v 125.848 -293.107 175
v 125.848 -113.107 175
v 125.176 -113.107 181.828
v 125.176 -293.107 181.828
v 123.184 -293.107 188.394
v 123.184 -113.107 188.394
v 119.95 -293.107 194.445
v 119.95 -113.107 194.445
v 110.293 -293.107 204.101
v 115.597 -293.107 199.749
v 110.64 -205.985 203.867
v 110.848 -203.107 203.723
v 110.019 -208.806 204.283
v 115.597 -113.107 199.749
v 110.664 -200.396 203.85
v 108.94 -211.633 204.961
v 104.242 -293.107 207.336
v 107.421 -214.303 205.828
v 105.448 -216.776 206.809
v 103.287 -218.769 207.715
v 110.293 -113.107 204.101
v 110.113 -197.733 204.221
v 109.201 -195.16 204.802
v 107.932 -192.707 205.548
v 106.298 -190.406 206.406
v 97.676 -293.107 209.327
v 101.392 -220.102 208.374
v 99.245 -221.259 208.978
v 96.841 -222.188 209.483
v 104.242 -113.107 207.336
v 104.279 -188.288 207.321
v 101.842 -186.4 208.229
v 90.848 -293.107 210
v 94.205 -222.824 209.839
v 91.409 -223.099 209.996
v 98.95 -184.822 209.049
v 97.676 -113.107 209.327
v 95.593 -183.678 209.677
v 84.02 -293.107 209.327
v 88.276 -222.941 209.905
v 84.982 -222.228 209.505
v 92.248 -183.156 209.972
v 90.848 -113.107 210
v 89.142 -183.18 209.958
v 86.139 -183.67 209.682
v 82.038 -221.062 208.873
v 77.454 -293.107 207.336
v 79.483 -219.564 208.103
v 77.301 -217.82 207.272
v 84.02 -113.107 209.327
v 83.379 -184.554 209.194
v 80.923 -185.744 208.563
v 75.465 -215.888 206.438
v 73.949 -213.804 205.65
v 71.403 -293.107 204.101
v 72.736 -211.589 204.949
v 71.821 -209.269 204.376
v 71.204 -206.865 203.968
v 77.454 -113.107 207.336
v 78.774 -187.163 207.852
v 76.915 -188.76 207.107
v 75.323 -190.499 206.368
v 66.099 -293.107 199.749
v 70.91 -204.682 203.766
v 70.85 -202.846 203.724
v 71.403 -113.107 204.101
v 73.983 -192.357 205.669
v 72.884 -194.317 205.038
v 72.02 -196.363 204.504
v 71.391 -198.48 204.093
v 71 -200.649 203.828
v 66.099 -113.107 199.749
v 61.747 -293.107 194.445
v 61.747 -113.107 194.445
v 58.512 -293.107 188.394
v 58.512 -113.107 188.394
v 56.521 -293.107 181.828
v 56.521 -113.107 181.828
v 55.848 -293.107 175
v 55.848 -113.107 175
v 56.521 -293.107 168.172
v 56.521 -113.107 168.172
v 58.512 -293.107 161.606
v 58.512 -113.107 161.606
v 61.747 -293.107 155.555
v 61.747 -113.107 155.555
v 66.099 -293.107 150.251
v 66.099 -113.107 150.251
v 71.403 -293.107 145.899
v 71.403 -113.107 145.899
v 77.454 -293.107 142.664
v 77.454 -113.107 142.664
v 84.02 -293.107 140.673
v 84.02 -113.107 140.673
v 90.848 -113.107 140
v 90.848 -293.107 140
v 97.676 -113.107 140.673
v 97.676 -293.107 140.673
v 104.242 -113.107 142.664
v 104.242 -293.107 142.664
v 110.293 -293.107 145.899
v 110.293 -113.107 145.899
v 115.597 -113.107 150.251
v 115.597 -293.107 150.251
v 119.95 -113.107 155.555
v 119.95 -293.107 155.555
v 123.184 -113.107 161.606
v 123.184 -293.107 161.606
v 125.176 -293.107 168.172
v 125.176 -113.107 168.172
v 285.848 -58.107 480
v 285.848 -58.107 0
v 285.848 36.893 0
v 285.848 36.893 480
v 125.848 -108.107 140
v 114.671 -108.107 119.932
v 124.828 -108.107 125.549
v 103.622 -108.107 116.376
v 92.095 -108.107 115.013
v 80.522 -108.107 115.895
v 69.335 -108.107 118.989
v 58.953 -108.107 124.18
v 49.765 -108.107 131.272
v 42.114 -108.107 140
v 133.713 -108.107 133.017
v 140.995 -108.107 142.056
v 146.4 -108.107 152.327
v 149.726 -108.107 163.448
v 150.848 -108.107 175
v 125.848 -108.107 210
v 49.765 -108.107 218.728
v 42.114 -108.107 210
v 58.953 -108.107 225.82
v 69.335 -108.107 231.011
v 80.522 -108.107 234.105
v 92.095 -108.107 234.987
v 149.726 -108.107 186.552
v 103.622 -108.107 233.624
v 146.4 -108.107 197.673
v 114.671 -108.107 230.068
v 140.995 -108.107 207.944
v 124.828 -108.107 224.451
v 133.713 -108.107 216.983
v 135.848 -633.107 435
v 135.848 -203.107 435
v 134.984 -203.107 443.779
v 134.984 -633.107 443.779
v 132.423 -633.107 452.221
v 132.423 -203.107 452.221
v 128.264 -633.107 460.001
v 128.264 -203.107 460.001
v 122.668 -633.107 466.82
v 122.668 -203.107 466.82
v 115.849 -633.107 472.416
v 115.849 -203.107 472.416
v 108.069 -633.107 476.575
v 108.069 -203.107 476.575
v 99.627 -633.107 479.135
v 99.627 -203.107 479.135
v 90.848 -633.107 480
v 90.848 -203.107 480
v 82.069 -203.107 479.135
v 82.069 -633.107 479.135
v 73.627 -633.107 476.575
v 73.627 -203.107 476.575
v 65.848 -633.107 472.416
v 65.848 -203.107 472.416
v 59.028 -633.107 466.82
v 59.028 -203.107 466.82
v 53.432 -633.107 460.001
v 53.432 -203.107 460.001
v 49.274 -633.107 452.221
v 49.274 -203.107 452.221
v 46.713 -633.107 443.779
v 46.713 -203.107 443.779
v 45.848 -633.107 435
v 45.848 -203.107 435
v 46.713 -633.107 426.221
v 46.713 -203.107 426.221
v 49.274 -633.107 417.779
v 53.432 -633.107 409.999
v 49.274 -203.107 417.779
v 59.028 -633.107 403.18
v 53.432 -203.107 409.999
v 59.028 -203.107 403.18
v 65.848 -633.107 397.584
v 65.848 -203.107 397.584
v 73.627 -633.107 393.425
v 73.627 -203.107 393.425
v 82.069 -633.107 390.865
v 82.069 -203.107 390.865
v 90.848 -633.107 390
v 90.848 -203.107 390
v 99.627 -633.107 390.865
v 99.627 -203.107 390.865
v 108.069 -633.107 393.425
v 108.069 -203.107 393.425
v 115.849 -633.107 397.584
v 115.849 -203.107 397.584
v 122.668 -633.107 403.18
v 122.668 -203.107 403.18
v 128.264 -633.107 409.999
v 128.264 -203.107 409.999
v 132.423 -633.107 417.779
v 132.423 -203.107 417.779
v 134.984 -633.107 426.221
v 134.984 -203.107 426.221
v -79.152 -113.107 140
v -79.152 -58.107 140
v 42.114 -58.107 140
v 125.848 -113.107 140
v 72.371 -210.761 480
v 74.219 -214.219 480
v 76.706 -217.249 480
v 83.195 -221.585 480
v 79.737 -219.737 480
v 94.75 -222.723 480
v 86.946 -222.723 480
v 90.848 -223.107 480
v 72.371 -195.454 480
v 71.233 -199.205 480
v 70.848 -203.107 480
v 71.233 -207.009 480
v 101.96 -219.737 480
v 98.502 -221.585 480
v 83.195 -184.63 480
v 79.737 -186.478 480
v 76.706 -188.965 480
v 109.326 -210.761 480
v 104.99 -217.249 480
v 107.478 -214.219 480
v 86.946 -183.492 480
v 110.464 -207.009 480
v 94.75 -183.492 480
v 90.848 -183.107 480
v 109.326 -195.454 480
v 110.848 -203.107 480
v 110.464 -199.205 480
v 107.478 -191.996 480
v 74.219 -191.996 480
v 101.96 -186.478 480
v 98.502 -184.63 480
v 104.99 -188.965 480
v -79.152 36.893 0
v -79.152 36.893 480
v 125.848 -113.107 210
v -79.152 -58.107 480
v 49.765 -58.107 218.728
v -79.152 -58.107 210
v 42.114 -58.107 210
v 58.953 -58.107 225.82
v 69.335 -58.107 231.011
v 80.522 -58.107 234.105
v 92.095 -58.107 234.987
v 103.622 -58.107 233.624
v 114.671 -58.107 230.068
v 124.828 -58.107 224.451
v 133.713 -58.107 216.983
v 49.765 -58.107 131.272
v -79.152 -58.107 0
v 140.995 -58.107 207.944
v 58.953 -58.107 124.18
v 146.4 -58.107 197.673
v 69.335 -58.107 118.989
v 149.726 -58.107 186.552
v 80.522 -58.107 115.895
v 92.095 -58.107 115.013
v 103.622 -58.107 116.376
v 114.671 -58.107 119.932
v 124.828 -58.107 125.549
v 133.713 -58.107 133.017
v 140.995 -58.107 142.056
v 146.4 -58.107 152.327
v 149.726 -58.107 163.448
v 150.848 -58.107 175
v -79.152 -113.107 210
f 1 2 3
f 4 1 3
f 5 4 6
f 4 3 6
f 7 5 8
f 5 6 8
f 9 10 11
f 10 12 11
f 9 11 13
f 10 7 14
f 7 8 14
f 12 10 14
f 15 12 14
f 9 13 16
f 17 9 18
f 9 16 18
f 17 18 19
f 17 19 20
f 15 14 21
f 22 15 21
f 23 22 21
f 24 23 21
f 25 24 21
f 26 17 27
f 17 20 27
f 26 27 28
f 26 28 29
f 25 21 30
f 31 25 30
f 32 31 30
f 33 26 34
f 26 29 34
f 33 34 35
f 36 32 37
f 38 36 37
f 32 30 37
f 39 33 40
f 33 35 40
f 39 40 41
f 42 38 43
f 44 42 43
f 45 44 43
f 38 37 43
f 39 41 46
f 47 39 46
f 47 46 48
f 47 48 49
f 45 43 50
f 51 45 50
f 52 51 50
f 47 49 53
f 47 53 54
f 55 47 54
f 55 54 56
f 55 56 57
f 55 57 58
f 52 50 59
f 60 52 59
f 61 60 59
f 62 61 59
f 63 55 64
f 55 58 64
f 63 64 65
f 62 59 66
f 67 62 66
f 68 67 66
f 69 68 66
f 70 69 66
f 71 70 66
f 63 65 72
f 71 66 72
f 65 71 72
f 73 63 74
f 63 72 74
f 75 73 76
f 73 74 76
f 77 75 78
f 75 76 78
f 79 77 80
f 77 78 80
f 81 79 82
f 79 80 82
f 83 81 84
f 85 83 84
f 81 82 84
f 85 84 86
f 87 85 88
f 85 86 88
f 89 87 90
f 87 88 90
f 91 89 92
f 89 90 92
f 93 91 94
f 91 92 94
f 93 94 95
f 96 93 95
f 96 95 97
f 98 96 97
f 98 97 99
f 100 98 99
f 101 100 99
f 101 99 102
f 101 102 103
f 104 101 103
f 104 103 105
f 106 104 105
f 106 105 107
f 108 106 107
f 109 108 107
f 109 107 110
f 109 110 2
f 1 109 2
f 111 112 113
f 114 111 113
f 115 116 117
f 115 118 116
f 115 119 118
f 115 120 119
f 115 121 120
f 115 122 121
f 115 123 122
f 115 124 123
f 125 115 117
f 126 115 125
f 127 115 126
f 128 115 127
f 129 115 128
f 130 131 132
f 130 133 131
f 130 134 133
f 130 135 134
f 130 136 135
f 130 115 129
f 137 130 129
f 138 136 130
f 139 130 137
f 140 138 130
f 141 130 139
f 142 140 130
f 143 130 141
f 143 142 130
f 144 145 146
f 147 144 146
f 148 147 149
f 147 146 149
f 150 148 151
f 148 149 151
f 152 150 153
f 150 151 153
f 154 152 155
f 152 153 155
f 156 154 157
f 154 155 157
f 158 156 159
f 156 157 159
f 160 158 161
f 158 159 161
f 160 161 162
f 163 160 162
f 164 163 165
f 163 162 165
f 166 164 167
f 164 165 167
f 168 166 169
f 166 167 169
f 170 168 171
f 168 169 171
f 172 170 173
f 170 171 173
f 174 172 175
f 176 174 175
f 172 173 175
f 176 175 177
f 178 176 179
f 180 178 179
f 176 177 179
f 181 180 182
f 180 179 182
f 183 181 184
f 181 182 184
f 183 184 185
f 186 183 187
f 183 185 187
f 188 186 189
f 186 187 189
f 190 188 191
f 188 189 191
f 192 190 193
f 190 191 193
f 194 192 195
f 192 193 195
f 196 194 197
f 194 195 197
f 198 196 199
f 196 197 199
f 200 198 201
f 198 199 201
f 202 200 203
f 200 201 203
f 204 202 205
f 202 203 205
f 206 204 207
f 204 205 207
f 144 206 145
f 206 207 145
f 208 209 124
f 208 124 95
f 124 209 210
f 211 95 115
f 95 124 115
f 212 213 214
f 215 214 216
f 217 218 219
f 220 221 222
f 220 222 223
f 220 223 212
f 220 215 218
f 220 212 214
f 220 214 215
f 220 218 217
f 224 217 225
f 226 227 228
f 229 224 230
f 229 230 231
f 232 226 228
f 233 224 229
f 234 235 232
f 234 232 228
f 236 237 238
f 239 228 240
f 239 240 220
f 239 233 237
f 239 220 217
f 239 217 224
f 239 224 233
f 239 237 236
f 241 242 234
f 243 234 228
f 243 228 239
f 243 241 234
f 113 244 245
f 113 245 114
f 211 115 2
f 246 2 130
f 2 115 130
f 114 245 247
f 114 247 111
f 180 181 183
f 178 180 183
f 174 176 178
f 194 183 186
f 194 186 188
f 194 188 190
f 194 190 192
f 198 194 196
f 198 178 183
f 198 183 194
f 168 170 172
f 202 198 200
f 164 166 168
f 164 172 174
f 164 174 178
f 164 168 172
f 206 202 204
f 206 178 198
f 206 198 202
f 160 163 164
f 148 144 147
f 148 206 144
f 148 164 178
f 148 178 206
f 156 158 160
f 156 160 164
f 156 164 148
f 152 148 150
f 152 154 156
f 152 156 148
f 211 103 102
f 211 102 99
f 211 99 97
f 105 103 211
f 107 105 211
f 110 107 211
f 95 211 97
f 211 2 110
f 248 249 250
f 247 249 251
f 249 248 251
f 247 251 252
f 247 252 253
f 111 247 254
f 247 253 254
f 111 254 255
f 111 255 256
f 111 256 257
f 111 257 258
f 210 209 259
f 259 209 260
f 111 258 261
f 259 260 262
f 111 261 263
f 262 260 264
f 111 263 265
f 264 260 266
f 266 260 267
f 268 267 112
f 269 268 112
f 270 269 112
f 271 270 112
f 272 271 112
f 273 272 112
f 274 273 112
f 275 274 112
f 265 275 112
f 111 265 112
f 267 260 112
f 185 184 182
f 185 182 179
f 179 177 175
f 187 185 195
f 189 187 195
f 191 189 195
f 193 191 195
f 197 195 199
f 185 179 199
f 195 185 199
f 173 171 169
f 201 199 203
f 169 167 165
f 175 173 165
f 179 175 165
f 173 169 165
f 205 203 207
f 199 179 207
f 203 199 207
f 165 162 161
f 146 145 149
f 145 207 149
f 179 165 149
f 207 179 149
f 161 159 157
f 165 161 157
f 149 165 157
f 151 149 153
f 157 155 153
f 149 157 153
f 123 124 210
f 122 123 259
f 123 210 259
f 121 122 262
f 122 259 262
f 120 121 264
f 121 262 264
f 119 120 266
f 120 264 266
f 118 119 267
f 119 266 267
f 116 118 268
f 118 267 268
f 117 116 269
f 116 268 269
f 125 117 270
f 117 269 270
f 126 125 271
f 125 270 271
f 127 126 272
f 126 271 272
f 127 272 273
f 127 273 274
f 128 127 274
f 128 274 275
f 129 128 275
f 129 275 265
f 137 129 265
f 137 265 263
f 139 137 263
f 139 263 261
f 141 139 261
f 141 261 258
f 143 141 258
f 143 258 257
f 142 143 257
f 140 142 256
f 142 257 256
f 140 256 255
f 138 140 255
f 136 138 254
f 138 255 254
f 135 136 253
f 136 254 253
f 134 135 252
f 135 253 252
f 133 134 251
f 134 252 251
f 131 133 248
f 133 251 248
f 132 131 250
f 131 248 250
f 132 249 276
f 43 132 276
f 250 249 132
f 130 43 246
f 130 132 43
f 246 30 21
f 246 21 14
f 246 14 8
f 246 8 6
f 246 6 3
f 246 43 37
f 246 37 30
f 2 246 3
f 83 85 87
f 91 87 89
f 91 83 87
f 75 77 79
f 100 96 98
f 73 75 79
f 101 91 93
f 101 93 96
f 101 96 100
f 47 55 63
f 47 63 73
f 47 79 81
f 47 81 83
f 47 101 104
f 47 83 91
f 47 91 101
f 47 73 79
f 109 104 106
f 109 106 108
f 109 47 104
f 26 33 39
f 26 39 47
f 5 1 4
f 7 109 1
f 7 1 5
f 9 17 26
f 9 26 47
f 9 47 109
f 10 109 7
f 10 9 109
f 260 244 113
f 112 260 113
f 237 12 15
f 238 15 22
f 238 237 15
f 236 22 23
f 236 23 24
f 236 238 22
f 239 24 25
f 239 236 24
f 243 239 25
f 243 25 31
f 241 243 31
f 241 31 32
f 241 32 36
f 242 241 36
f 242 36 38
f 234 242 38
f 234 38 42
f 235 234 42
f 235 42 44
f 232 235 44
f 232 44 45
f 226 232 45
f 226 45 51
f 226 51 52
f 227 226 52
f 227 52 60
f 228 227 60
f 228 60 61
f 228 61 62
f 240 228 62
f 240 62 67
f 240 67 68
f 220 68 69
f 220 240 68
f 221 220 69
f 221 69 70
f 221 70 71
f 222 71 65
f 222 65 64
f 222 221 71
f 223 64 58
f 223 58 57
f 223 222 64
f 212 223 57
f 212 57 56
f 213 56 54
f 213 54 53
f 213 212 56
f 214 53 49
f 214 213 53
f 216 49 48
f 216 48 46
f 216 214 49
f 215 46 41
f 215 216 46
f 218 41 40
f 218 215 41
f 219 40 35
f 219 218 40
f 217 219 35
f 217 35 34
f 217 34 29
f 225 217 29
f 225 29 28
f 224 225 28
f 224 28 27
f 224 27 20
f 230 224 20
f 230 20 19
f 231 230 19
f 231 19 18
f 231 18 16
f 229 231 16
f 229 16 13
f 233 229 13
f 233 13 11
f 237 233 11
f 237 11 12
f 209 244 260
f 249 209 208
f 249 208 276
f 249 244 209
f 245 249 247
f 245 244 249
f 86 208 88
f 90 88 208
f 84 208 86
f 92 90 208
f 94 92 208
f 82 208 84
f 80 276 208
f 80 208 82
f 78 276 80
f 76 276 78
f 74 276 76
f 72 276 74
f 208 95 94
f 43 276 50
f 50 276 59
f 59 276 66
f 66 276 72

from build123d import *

# Parameters (mm, degrees)
ESQUISSE1_W        = 365
ESQUISSE1_H        = 95
BOSS_EXTRU_1_DEPTH = 480
ESQUISSE3_R        = 35
BOSS_EXTRU_2_DEPTH = 235
BOSS_EXTRU_3_REACH = 482
ESQUISSE4_R        = 20
BOSS_EXTRU_4_START = 145
ESQUISSE5_R        = 45
BOSS_EXTRU_4_DEPTH = 430
ESQUISSE6_W        = 205
ESQUISSE6_H        = 70
BOSS_EXTRU_5_DEPTH = 55
ESQUISSE7_R        = 60
BOSS_EXTRU_6_DEPTH = 50


with BuildPart() as part:
    # Esquisse1 → Boss.-Extru.1 (new body)
    with BuildSketch(Plane.XY):
        with Locations((103.348235656, -10.607228484)):
            Rectangle(ESQUISSE1_W, ESQUISSE1_H)
    extrude(amount=BOSS_EXTRU_1_DEPTH)

    # Esquisse3 → Boss.-Extru.2 (add)
    with BuildSketch(Plane.XZ.offset(58.107228484)):
        with Locations((90.848235656, 175)):
            Circle(ESQUISSE3_R)
    extrude(amount=BOSS_EXTRU_2_DEPTH)

    # Esquisse4 → Boss.-Extru.3 (add, up to next)
    with BuildSketch(Plane.XY.offset(480), mode=Mode.PRIVATE) as boss_extru_3_sk1:
        with Locations((90.848235656, -203.107228484)):
            Circle(ESQUISSE4_R)
    boss_extru_3_tool1 = extrude(boss_extru_3_sk1.sketch, amount=-BOSS_EXTRU_3_REACH, mode=Mode.PRIVATE) - part.part
    add(boss_extru_3_tool1.solids().sort_by_distance((90.848236, -203.107228, 480))[0])

    # Esquisse6 → Boss.-Extru.5 (add)
    with BuildSketch(Plane.XZ.offset(58.107228484)):
        with Locations((23.348235656, 175)):
            Rectangle(ESQUISSE6_W, ESQUISSE6_H)
    extrude(amount=BOSS_EXTRU_5_DEPTH)

    # Esquisse7 → Boss.-Extru.6 (add)
    with BuildSketch(Plane.XZ.offset(58.107228484)):
        with Locations((90.848235656, 175)):
            Circle(ESQUISSE7_R)
    extrude(amount=BOSS_EXTRU_6_DEPTH)


with BuildPart() as body_2:
    # Esquisse5 → Boss.-Extru.4 (new body)
    with BuildSketch(Plane.XZ.offset(58.107228484).offset(BOSS_EXTRU_4_START)):
        with Locations((90.848235656, 435)):
            Circle(ESQUISSE5_R)
    extrude(amount=BOSS_EXTRU_4_DEPTH)


solid = Compound([part.part, body_2.part])
